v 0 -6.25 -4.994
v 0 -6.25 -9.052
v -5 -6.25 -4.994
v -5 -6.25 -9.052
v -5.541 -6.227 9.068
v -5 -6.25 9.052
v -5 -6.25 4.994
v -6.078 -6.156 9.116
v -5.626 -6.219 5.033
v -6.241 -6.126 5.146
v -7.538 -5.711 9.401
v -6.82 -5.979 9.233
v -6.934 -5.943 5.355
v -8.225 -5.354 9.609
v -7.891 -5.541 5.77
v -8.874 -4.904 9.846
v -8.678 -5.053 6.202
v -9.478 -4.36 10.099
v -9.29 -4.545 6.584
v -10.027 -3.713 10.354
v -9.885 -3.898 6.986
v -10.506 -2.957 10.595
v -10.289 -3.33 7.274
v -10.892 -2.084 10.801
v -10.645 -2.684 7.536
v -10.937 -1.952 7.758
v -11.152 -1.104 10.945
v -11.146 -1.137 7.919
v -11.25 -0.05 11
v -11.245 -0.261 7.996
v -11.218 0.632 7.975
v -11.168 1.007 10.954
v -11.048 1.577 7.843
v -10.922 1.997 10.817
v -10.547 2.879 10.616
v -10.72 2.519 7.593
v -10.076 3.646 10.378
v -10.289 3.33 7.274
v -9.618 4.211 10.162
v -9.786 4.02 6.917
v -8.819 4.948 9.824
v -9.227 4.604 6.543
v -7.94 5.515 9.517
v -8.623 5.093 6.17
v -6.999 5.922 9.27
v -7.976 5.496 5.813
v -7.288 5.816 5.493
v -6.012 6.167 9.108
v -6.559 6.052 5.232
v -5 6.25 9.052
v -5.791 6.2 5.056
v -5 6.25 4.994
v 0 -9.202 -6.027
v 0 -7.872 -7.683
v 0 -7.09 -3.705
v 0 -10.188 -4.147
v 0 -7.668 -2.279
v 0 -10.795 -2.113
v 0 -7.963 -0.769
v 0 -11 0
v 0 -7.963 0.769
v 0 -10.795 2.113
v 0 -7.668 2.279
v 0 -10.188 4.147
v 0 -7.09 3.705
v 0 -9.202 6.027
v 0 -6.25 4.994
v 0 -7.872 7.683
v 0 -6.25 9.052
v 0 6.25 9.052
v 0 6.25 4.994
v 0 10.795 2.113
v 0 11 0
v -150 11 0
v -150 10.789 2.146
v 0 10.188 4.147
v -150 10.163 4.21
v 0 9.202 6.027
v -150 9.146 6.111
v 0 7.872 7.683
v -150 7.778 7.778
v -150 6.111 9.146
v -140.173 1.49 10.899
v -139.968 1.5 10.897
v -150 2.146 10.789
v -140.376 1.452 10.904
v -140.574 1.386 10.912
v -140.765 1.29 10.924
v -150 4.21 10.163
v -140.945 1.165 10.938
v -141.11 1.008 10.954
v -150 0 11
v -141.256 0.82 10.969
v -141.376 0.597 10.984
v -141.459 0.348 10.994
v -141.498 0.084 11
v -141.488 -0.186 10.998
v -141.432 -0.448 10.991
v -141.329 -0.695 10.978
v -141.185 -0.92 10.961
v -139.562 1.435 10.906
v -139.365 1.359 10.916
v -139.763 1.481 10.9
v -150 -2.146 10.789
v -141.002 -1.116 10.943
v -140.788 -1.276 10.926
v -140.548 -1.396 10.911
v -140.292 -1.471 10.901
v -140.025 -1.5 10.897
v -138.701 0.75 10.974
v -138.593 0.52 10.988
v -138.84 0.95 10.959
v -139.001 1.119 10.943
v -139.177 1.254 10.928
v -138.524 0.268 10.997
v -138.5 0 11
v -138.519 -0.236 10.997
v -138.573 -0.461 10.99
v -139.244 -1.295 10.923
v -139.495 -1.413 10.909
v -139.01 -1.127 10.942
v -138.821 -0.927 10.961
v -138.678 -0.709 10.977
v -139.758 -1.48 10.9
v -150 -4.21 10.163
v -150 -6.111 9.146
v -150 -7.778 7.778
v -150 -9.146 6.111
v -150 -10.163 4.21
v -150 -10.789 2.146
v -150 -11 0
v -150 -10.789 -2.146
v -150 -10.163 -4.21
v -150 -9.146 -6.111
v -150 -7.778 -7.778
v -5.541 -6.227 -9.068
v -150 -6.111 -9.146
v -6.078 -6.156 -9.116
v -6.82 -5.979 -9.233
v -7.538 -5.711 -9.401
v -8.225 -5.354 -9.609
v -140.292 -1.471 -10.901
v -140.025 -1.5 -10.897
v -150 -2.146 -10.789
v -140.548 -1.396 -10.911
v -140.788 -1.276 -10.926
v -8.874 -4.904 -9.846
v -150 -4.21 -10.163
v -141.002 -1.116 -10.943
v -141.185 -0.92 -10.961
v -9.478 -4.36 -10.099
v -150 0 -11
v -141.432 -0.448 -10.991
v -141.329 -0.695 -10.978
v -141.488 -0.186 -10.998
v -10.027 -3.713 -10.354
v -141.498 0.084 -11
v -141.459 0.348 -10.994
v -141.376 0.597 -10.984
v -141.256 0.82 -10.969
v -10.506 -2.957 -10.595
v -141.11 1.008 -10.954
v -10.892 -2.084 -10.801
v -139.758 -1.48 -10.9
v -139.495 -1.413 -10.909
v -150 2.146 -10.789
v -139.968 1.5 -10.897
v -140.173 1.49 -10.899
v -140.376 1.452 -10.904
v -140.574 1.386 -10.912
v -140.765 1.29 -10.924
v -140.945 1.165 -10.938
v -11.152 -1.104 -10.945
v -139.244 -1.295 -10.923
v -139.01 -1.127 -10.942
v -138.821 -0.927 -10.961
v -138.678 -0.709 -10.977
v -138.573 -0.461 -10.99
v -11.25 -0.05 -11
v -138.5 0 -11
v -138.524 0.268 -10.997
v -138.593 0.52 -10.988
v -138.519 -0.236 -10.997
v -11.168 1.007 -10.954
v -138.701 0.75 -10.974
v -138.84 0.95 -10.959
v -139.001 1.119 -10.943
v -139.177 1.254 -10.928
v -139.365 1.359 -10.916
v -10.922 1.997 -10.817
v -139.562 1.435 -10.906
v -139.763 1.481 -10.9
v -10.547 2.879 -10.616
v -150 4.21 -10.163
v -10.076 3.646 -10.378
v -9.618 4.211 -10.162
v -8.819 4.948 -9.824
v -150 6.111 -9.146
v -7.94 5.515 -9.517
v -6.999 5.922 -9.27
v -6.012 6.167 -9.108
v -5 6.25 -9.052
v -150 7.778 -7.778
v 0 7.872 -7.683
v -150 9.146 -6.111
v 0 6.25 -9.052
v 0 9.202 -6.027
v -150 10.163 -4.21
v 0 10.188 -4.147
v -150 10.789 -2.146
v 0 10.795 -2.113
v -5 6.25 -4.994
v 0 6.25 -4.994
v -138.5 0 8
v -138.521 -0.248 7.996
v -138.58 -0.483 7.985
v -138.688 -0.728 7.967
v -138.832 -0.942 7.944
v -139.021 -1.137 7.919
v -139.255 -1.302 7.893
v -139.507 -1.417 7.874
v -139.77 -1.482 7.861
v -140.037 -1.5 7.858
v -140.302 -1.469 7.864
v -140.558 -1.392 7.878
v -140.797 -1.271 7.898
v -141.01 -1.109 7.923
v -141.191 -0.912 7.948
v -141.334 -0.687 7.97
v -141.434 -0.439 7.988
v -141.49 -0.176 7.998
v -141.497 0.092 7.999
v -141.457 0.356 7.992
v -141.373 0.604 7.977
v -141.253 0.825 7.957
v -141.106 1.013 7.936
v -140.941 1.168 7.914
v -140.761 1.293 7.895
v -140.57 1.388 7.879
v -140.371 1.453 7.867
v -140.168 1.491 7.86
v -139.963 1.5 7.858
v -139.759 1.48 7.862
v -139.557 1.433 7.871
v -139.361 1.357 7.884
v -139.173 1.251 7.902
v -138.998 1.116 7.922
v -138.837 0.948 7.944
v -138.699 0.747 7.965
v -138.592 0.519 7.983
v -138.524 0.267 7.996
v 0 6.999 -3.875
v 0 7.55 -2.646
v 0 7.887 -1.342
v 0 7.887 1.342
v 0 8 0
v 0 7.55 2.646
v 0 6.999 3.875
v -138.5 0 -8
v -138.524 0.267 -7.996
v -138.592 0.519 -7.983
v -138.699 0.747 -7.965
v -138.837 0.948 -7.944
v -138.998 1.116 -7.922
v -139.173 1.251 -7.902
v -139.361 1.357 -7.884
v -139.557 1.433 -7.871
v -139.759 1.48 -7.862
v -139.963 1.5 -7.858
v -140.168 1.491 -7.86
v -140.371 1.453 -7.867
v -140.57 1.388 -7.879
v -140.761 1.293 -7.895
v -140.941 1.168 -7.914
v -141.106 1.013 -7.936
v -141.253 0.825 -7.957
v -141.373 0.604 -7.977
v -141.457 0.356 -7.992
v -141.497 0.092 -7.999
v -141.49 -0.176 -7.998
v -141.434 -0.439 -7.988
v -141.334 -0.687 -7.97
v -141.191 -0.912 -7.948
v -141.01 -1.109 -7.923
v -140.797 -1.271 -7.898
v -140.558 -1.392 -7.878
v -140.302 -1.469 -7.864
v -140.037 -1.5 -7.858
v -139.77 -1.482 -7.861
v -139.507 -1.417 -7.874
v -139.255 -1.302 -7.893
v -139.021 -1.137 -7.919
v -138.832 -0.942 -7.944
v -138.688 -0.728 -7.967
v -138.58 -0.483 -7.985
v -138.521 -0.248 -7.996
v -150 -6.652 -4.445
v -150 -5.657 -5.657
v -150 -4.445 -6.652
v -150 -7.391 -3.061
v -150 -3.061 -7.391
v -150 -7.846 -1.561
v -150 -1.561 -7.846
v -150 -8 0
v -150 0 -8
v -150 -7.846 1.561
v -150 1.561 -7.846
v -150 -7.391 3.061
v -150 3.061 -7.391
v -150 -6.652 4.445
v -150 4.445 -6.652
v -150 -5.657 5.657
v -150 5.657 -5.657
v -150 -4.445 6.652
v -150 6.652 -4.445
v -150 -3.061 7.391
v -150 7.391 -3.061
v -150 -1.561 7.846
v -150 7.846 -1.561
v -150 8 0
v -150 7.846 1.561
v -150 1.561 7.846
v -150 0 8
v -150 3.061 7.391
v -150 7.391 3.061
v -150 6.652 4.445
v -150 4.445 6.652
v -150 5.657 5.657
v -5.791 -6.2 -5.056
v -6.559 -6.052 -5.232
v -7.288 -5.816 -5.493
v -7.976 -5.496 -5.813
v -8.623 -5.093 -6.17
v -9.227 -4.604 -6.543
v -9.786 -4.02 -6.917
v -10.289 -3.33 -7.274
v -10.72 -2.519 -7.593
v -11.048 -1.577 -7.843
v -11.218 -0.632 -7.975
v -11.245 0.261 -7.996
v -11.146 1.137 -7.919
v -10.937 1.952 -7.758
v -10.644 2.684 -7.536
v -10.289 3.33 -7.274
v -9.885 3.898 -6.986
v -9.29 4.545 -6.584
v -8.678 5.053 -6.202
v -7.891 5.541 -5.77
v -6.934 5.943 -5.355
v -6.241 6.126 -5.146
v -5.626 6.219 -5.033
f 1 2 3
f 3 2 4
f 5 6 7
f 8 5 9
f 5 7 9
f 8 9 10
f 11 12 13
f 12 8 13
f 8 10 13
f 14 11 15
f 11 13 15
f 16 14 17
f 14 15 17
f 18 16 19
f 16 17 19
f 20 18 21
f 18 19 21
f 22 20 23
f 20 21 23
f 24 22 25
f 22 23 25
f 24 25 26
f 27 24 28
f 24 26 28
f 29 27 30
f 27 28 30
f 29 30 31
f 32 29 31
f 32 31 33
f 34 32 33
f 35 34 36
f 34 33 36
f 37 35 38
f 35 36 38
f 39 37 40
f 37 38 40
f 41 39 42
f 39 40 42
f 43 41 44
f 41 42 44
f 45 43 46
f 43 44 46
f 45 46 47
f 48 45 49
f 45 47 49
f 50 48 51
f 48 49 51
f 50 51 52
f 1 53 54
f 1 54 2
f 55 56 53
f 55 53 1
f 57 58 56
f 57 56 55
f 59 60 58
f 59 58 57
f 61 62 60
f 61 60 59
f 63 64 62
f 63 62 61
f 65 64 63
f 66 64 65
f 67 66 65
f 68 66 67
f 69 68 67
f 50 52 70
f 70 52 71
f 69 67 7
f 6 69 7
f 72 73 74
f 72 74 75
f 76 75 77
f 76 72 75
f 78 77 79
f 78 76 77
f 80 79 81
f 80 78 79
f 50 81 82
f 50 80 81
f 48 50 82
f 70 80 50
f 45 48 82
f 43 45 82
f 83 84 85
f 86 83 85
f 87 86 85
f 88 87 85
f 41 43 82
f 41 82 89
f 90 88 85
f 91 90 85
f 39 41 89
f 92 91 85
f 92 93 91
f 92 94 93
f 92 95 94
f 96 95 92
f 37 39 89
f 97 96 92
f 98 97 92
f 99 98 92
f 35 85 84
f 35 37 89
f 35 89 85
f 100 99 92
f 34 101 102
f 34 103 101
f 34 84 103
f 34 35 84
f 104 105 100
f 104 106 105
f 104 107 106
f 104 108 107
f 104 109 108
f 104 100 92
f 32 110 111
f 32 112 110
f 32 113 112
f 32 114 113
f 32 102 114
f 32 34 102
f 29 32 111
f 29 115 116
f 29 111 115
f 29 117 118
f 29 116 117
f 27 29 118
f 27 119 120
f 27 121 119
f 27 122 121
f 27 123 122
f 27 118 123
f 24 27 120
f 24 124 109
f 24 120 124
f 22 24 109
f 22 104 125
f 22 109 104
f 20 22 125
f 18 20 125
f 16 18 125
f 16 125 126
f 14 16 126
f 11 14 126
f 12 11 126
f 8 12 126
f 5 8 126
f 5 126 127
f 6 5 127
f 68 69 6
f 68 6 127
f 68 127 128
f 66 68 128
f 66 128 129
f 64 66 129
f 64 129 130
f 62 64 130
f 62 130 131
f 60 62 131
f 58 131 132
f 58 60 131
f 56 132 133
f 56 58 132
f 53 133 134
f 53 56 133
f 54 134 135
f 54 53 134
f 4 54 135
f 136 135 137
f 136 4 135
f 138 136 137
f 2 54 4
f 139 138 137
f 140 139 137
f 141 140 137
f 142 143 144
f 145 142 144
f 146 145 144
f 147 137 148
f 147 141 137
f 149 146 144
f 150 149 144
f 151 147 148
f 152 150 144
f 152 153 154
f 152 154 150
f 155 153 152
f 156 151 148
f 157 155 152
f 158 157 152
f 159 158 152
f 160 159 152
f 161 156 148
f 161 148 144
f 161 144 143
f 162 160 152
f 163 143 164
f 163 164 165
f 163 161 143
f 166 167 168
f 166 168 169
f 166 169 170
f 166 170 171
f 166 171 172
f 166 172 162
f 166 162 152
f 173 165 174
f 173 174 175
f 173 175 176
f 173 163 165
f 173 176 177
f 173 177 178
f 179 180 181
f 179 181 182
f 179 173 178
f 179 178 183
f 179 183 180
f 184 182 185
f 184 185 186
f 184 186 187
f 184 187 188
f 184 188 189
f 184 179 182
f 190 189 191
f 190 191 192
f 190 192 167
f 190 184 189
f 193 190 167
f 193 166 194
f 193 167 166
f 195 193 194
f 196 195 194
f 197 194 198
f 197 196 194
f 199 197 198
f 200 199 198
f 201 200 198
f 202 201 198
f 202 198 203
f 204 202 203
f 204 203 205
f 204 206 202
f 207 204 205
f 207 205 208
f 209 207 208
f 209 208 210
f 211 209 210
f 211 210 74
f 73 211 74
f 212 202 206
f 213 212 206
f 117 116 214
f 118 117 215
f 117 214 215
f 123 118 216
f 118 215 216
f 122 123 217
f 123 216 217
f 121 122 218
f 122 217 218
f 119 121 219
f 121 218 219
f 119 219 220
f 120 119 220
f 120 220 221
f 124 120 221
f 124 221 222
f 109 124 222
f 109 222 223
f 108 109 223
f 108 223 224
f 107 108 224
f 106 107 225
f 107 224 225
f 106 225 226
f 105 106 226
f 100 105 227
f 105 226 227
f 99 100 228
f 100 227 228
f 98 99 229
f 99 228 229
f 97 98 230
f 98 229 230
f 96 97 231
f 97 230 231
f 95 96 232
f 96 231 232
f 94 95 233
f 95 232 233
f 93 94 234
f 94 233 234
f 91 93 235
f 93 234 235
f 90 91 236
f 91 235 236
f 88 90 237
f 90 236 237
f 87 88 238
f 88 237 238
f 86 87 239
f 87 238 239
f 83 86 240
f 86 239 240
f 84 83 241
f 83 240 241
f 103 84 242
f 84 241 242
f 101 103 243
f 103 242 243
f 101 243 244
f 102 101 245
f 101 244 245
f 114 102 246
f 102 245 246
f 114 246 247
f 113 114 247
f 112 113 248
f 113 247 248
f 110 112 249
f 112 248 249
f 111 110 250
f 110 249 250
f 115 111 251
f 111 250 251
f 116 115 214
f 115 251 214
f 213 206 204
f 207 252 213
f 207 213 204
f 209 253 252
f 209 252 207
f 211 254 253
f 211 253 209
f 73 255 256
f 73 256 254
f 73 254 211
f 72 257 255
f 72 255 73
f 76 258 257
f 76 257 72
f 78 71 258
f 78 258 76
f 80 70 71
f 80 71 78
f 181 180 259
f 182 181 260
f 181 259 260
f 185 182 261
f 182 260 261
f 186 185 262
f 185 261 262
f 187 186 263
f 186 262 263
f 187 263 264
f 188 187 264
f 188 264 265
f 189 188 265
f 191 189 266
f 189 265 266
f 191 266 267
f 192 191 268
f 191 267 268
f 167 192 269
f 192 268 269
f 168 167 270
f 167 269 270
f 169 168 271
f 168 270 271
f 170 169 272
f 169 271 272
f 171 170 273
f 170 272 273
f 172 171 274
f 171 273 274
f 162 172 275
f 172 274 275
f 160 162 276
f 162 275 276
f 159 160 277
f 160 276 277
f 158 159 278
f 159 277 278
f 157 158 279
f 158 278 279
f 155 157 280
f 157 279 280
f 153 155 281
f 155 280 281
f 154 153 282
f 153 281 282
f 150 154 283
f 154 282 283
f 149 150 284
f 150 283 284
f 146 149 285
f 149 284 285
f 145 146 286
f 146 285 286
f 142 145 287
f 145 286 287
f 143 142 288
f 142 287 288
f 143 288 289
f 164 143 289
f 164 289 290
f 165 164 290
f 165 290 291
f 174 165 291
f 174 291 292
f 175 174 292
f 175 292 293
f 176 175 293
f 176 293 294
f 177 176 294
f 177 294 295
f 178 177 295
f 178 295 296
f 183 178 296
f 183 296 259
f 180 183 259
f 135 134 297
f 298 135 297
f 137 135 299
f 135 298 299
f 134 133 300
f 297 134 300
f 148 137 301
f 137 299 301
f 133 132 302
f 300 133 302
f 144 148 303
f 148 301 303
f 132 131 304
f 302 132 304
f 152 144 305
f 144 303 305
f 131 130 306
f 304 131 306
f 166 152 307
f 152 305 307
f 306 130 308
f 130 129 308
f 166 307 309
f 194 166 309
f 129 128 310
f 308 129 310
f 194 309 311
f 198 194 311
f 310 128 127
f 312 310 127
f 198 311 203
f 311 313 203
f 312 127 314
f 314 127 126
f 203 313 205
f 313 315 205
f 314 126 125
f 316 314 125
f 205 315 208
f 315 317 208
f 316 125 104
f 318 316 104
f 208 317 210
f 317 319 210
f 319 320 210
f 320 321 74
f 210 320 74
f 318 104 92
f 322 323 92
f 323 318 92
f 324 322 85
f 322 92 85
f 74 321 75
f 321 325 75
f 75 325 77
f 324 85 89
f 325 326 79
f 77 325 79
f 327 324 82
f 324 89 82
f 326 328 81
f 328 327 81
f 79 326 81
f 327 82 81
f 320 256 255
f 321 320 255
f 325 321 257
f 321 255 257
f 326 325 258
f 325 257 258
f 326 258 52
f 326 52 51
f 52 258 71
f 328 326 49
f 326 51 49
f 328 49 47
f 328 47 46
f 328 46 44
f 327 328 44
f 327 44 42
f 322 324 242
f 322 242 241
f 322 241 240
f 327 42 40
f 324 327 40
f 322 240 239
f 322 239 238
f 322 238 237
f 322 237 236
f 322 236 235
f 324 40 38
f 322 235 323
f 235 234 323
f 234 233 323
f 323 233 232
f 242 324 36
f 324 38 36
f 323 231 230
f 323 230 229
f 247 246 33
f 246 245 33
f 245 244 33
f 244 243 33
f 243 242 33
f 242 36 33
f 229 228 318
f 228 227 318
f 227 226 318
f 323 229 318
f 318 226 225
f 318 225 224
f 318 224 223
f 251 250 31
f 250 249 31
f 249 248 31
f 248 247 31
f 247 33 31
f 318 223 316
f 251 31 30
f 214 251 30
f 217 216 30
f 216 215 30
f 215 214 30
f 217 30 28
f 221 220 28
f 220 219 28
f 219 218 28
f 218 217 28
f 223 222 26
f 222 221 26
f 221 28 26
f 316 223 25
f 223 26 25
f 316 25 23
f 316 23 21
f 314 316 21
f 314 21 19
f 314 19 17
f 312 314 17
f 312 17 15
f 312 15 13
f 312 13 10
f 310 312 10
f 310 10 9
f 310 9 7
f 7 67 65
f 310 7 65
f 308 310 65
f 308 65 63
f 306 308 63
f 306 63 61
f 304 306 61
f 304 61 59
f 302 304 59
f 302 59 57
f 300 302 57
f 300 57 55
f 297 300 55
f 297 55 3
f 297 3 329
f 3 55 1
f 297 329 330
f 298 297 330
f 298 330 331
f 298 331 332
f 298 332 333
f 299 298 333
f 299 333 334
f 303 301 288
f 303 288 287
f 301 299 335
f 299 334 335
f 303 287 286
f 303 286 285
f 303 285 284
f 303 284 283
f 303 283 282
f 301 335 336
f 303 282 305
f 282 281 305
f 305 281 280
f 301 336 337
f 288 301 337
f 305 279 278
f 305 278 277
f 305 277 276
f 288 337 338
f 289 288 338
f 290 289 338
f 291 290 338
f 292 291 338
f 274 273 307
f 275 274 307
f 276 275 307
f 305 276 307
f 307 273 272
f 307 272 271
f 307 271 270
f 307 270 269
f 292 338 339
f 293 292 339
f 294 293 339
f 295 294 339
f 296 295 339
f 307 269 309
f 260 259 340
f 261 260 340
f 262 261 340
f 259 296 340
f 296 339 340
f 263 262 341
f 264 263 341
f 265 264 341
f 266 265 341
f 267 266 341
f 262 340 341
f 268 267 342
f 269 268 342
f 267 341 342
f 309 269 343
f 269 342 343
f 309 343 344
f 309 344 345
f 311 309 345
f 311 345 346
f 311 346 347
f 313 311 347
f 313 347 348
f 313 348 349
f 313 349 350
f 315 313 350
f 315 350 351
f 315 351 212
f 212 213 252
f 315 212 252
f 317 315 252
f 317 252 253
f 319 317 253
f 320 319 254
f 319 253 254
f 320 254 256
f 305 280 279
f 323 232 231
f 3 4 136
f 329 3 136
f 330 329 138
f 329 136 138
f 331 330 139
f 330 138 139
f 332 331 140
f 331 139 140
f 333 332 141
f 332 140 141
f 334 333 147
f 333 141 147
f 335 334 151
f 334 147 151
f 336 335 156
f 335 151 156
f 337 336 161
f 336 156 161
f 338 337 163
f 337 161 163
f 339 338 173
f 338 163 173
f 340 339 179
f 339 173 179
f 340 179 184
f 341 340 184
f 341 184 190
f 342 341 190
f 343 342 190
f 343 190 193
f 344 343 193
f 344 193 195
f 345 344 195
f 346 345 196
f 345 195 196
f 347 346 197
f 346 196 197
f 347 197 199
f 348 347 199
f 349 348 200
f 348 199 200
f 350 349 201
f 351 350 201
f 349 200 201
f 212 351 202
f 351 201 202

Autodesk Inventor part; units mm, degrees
ref_plane "YZ Plane" through (0, 0, 0) normal (1, 0, 0) x (0, 1, 0)
ref_plane "XZ Plane" through (0, 0, 0) normal (0, 1, 0) x (-1, 0, 0)
ref_plane "XY Plane" through (0, 0, 0) normal (0, 0, 1) x (1, 0, 0)
sketch "スケッチ1" plane through (0, 0, 0) normal (1, 0, 0) x (0, 1, 0)
  circle A0 centre (0, 0) radius 11
  circle A1 centre (0, 0) radius 8
  dimension "d0" = 22
  dimension "d1" = 16
extrude "押し出し1" add sketch "スケッチ1" against normal blind 150
sketch "スケッチ2" plane through (0, 0, 0) normal (0, 0, 1) x (1, 0, 0)
  line L0 (0, 0) -> (0, 6.25)
  line L1 (0, 8) -> (0, -8) projected
  line L2 (0, 0) -> (0, -6.25)
  line L3 (0, -6.25) -> (-5, -6.25)
  line L4 (-5, -6.25) -> (-5, 6.25)
  line L5 (-5, 6.25) -> (0, 6.25)
  dimension "d4" = 6.25
  dimension "d5" = 6.25
  dimension "d6" = 5
extrude "押し出し2" cut sketch "スケッチ2" along normal mid plane 150
sketch "スケッチ3" plane through (0, 0, 0) normal (0, 0, 1) x (1, 0, 0)
  line L0 (-5, -6.25) -> (-5, 6.25) projected
  line L1 (-5, 6.25) -> (0, 6.25) projected
  circle A0 centre (-5, 0) radius 6.25
  point P0 (0, 0)
extrude "押し出し3" cut sketch "スケッチ3" along normal mid plane 150 contours A0 L0 picked at (-7.0681, 0.2511)
sketch "スケッチ4" plane through (0, 0, 0) normal (0, 0, 1) x (1, 0, 0)
  circle A0 centre (-140, 0) radius 1.5
  point P0 (0, 0)
  dimension "d11" = 3
extrude "押し出し4" cut sketch "スケッチ4" along normal mid plane 150
thread "ねじ1" size "M3x0.5" class "6H" standard "ANSI Metric M Profile" full length
thread "ねじ2" size "M3x0.5" class "6H" standard "ANSI Metric M Profile" full length
properties part number "VP16_200" material "PVC 配管"
